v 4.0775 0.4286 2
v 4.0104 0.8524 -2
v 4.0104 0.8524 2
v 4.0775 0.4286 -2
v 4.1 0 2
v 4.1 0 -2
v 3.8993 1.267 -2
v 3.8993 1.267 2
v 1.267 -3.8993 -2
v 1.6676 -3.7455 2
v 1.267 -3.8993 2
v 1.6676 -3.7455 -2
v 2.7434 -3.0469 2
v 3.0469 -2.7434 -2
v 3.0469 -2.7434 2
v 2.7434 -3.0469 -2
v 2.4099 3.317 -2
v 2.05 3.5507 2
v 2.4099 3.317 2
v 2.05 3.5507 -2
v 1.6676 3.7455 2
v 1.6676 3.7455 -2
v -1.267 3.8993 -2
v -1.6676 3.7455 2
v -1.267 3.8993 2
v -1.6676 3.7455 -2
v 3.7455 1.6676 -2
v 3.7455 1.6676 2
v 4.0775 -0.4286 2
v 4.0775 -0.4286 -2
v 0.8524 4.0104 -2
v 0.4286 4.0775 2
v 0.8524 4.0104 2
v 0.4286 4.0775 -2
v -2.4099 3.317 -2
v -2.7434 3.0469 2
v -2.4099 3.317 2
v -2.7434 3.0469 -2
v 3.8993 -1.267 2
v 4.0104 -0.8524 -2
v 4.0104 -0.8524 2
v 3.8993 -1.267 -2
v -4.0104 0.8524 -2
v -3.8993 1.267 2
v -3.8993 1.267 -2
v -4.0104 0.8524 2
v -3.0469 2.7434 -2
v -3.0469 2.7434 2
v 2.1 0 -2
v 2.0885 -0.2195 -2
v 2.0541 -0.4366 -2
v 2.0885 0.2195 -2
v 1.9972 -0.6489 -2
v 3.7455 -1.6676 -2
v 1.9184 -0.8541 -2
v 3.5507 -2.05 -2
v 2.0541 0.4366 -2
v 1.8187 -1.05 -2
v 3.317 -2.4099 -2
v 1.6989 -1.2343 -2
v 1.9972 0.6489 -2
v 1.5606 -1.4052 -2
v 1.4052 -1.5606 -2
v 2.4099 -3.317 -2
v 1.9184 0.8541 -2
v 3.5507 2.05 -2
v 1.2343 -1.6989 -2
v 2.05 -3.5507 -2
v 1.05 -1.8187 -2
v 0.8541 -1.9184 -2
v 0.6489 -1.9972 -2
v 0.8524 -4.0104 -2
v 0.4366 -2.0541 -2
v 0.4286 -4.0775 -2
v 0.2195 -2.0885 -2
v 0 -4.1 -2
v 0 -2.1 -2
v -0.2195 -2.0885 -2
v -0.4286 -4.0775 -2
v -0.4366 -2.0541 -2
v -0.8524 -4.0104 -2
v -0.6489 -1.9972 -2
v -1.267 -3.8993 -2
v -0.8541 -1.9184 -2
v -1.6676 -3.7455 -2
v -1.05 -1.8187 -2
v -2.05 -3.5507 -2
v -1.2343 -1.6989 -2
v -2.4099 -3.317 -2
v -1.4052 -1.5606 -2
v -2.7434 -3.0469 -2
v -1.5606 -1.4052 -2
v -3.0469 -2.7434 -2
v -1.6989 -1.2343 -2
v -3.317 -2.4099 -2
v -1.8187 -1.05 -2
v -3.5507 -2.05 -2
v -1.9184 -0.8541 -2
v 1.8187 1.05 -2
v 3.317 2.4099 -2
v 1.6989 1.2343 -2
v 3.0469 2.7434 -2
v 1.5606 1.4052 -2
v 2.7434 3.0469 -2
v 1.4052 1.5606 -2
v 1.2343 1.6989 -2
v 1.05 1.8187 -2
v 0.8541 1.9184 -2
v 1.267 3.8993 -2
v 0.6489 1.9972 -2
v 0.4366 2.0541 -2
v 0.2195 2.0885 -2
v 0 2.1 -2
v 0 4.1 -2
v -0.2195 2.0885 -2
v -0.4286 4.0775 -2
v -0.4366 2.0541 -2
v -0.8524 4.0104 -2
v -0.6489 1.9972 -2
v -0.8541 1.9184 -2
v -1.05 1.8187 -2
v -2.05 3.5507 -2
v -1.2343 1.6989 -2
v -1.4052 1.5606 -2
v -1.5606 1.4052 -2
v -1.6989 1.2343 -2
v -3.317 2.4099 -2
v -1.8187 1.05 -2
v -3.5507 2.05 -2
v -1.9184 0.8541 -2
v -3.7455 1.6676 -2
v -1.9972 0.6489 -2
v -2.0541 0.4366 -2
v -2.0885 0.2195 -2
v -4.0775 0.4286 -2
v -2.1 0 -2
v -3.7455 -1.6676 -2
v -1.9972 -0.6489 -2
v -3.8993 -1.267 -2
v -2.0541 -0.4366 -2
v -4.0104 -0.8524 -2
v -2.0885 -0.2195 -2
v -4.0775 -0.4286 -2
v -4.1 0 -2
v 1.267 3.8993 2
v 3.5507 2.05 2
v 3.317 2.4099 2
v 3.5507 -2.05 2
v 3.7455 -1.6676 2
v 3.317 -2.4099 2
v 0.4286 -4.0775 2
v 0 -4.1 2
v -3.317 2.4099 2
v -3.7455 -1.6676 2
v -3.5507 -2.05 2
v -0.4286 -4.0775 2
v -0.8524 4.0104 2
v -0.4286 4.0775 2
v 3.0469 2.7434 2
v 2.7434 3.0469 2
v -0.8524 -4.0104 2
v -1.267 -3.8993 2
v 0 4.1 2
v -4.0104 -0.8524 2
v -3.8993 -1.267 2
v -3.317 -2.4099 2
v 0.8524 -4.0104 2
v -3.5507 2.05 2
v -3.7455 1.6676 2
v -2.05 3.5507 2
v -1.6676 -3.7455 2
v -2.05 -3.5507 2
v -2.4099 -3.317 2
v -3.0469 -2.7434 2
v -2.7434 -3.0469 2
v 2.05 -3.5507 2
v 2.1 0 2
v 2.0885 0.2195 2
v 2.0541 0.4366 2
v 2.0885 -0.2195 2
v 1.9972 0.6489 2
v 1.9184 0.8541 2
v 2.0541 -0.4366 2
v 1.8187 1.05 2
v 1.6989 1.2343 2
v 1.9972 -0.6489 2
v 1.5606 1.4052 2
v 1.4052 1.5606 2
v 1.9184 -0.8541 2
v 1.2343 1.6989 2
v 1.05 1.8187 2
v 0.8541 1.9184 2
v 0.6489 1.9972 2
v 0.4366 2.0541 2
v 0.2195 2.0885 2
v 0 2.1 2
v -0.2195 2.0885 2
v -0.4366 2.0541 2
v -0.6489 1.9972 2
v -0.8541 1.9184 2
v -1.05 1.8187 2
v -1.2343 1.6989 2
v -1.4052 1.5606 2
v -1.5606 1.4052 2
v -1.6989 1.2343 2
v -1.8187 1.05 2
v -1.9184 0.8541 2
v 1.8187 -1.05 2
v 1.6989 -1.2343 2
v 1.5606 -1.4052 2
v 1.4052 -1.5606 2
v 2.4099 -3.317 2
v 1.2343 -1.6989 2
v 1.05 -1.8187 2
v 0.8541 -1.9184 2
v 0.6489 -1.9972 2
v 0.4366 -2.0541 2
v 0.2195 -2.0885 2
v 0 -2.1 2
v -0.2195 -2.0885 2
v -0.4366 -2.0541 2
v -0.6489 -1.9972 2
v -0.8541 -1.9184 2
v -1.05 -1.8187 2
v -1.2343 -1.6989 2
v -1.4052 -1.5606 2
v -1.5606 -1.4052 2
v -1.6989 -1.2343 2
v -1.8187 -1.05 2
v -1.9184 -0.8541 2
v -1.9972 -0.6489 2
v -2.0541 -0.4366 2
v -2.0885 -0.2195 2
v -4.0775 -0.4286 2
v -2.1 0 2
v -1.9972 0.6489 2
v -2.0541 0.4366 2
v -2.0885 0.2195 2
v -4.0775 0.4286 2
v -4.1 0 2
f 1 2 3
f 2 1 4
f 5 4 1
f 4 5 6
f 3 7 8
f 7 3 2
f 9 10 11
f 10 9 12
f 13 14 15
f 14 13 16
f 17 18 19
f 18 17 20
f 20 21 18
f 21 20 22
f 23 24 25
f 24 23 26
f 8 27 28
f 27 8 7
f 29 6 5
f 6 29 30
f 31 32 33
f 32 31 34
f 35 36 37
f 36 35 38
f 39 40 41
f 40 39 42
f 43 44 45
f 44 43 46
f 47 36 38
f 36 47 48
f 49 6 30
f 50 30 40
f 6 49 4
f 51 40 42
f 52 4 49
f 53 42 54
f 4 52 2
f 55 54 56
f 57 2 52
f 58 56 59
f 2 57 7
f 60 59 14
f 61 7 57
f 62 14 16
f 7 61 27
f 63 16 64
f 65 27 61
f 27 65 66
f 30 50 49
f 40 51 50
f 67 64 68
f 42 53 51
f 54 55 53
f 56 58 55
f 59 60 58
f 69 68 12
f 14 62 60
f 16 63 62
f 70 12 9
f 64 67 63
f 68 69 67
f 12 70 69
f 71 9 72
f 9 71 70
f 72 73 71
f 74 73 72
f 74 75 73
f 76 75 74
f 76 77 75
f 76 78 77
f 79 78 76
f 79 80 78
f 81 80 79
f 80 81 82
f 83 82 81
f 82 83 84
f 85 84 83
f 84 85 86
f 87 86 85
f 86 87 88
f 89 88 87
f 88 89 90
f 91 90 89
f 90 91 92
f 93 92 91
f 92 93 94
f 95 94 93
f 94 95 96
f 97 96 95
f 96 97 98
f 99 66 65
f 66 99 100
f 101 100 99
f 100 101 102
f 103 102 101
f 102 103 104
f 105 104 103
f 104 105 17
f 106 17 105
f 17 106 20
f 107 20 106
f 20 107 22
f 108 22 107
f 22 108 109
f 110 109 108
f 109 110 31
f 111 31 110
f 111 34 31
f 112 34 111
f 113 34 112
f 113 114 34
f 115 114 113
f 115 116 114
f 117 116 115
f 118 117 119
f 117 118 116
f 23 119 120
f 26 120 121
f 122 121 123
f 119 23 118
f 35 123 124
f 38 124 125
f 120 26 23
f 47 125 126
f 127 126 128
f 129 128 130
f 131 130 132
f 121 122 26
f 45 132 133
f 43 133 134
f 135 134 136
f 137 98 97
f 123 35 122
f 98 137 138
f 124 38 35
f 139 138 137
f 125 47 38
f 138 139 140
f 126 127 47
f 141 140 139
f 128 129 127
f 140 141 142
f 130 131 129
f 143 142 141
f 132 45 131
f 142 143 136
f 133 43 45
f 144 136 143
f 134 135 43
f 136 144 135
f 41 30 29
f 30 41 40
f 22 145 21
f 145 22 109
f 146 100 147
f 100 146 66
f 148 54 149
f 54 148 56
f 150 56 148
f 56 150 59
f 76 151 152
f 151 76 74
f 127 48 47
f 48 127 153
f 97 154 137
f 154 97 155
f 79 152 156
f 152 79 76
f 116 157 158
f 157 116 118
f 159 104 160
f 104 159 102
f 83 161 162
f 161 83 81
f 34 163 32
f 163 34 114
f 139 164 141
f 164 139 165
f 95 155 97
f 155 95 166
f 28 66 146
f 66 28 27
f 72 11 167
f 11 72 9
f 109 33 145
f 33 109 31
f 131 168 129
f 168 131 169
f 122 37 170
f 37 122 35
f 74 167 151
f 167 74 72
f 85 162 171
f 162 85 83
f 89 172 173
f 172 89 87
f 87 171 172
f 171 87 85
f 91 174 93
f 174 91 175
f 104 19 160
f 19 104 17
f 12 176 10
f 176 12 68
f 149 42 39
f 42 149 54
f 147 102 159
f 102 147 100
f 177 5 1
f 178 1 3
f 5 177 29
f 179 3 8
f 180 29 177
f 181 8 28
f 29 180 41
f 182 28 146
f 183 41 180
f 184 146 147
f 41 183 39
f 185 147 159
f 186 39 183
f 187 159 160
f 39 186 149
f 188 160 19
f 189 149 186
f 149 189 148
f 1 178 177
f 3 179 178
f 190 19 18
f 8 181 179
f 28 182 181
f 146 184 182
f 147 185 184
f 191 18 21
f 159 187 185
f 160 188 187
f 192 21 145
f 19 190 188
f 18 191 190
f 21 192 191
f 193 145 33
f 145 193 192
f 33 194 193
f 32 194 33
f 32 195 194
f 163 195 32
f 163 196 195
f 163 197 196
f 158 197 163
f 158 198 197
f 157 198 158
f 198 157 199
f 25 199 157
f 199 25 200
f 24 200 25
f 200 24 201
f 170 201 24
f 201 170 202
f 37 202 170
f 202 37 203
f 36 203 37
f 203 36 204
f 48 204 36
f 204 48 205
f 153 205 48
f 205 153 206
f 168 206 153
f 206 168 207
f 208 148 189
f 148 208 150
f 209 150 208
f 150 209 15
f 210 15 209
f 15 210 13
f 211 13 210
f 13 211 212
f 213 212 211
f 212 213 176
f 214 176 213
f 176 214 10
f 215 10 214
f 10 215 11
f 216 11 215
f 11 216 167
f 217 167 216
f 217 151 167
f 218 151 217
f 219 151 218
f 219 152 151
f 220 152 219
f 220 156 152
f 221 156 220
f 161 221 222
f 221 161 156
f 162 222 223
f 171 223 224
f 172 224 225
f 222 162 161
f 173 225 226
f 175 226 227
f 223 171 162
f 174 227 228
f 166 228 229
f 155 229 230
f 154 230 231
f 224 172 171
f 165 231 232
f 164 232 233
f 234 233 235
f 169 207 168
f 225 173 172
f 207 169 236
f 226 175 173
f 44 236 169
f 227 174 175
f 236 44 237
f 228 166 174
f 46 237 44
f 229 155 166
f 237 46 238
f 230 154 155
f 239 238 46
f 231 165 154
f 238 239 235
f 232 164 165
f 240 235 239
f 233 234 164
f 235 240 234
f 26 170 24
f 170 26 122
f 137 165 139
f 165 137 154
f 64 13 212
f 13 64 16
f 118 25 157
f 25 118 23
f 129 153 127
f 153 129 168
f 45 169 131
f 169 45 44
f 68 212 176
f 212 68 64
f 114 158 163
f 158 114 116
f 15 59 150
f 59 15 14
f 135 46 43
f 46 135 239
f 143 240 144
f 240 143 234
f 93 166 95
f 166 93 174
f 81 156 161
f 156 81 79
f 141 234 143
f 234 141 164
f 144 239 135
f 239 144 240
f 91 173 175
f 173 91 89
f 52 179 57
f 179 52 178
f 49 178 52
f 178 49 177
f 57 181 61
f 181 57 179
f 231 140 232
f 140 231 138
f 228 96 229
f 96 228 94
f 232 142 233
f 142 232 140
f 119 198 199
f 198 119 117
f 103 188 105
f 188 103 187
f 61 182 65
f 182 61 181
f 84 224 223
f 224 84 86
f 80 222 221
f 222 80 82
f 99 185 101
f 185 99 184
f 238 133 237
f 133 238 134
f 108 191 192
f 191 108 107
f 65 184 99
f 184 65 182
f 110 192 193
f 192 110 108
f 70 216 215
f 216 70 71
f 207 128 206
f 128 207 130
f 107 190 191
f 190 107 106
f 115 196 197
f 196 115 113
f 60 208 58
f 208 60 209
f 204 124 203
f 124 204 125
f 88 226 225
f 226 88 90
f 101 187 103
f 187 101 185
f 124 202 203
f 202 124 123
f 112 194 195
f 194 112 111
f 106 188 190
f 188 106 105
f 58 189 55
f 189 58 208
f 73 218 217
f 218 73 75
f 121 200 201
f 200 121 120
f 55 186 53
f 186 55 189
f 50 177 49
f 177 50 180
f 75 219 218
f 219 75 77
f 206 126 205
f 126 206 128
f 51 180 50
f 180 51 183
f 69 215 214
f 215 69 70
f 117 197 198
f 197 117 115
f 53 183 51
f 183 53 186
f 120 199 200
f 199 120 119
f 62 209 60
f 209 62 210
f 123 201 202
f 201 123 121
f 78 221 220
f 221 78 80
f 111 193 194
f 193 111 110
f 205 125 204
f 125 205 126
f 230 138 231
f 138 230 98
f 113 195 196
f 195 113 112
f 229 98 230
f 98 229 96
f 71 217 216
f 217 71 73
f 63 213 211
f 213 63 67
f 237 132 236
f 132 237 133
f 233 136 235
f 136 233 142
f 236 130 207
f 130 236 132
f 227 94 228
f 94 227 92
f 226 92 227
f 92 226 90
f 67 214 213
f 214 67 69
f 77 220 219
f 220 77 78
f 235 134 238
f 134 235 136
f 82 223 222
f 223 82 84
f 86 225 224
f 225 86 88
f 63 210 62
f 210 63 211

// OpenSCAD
$fn=60;

gCenterBoltCutout=4.2;
gcorneCutout=2; 

//translate([-2.5,15.35,12])rotate([90,0,0]) #import("../EM/43884119/cubeSocket.stl");


//OuterPlate();
//InnerPlate();
centerCollar();

/////////////////////////////////////
module InnerPlate(){
	difference(){
		basePlate();
		translate([(-75/2)-3, 0, 0])
			cutoutHalfSide();
		mirror([1, 1, 0])
		translate([(-75/2)-3, 0, 0])
			cutoutWideSide();
		mirror([1, 0, 0])
		translate([(-75/2)-3, 0, 0])
			cutoutDoubbleSide();
		cutoutCenterPost();
		cutoutCornerPosts();
	}
}
/////////////////////////////////////
module basePlate(){	
	cornerCutOffset=2;
	difference(){
// Base
		cube([75, 75, 4],center=true);
// corners
		for(a=[[1,1],[-1,1],[-1,-1],[1,-1]]){
			translate([
				a[1]*(75/2)+(a[1]*cornerCutOffset),
				a[0]*(75/2)+(a[0]*cornerCutOffset), 
				0])
				rotate([0, 0, 45])
				cube([20,20,5],center=true);
		}
	}
}
/////////////////////////////////////
module cutoutWideSide(){

	hull(){
		for(a=[[10,13],[-10,28],[-10,-28],[10,-13]]){
			translate([a[0], a[1], 0])
				cube([.1, .1, 5],center=true);
		}
	}
}
/////////////////////////////////////
module cutoutHalfSide(){

	hull(){
		for(a=[[10,6],[-10,21],[-10,-21],[10,-6]]){
			translate([a[0], a[1], 0])
				cube([.1, .1, 5],center=true);
		}
	}
}
/////////////////////////////////////
module cutoutDoubbleSide(){

	translate([0, 13, 0])
	hull(){
		for(a=[[10,5],[-10,20],[-10,-20],[10,-5]]){
			translate([a[0], a[1], 0])
				cube([.1, .1, 5],center=true);
		}
	}
	translate([0, -12, 0])
	hull(){
		for(a=[[10,6],[-10,21],[-10,-21],[10,-6]]){
			translate([a[0], a[1], 0])
				cube([.1, .1, 5],center=true);
		}
	}
}
/////////////////////////////////////
module cutoutCenterPost(){
	cylinder(d=gCenterBoltCutout,h=10,center=true);
}
/////////////////////////////////////
module cutoutCornerPosts(){
	cornerCutOffset=-9;
	for(a=[[1,1],[-1,1],[-1,-1],[1,-1]]){
		translate([
			a[1]*(75/2)+(a[1]*cornerCutOffset),
			a[0]*(75/2)+(a[0]*cornerCutOffset), 
			0])
			cylinder(d=gcorneCutout,h=10,center=true);
		}
}
/////////////////////////////////////
module OuterPlate(){
	difference(){
		basePlate();
		cutoutCenterPost();
		cutoutCornerPosts();
	}
}
/////////////////////////////////////
module centerCollar(){
	difference(){
		cylinder(d=gCenterBoltCutout+4,h=4,center=true);
		cutoutCenterPost();
		
	}
}
/////////////////////////////////////
/////////////////////////////////////
